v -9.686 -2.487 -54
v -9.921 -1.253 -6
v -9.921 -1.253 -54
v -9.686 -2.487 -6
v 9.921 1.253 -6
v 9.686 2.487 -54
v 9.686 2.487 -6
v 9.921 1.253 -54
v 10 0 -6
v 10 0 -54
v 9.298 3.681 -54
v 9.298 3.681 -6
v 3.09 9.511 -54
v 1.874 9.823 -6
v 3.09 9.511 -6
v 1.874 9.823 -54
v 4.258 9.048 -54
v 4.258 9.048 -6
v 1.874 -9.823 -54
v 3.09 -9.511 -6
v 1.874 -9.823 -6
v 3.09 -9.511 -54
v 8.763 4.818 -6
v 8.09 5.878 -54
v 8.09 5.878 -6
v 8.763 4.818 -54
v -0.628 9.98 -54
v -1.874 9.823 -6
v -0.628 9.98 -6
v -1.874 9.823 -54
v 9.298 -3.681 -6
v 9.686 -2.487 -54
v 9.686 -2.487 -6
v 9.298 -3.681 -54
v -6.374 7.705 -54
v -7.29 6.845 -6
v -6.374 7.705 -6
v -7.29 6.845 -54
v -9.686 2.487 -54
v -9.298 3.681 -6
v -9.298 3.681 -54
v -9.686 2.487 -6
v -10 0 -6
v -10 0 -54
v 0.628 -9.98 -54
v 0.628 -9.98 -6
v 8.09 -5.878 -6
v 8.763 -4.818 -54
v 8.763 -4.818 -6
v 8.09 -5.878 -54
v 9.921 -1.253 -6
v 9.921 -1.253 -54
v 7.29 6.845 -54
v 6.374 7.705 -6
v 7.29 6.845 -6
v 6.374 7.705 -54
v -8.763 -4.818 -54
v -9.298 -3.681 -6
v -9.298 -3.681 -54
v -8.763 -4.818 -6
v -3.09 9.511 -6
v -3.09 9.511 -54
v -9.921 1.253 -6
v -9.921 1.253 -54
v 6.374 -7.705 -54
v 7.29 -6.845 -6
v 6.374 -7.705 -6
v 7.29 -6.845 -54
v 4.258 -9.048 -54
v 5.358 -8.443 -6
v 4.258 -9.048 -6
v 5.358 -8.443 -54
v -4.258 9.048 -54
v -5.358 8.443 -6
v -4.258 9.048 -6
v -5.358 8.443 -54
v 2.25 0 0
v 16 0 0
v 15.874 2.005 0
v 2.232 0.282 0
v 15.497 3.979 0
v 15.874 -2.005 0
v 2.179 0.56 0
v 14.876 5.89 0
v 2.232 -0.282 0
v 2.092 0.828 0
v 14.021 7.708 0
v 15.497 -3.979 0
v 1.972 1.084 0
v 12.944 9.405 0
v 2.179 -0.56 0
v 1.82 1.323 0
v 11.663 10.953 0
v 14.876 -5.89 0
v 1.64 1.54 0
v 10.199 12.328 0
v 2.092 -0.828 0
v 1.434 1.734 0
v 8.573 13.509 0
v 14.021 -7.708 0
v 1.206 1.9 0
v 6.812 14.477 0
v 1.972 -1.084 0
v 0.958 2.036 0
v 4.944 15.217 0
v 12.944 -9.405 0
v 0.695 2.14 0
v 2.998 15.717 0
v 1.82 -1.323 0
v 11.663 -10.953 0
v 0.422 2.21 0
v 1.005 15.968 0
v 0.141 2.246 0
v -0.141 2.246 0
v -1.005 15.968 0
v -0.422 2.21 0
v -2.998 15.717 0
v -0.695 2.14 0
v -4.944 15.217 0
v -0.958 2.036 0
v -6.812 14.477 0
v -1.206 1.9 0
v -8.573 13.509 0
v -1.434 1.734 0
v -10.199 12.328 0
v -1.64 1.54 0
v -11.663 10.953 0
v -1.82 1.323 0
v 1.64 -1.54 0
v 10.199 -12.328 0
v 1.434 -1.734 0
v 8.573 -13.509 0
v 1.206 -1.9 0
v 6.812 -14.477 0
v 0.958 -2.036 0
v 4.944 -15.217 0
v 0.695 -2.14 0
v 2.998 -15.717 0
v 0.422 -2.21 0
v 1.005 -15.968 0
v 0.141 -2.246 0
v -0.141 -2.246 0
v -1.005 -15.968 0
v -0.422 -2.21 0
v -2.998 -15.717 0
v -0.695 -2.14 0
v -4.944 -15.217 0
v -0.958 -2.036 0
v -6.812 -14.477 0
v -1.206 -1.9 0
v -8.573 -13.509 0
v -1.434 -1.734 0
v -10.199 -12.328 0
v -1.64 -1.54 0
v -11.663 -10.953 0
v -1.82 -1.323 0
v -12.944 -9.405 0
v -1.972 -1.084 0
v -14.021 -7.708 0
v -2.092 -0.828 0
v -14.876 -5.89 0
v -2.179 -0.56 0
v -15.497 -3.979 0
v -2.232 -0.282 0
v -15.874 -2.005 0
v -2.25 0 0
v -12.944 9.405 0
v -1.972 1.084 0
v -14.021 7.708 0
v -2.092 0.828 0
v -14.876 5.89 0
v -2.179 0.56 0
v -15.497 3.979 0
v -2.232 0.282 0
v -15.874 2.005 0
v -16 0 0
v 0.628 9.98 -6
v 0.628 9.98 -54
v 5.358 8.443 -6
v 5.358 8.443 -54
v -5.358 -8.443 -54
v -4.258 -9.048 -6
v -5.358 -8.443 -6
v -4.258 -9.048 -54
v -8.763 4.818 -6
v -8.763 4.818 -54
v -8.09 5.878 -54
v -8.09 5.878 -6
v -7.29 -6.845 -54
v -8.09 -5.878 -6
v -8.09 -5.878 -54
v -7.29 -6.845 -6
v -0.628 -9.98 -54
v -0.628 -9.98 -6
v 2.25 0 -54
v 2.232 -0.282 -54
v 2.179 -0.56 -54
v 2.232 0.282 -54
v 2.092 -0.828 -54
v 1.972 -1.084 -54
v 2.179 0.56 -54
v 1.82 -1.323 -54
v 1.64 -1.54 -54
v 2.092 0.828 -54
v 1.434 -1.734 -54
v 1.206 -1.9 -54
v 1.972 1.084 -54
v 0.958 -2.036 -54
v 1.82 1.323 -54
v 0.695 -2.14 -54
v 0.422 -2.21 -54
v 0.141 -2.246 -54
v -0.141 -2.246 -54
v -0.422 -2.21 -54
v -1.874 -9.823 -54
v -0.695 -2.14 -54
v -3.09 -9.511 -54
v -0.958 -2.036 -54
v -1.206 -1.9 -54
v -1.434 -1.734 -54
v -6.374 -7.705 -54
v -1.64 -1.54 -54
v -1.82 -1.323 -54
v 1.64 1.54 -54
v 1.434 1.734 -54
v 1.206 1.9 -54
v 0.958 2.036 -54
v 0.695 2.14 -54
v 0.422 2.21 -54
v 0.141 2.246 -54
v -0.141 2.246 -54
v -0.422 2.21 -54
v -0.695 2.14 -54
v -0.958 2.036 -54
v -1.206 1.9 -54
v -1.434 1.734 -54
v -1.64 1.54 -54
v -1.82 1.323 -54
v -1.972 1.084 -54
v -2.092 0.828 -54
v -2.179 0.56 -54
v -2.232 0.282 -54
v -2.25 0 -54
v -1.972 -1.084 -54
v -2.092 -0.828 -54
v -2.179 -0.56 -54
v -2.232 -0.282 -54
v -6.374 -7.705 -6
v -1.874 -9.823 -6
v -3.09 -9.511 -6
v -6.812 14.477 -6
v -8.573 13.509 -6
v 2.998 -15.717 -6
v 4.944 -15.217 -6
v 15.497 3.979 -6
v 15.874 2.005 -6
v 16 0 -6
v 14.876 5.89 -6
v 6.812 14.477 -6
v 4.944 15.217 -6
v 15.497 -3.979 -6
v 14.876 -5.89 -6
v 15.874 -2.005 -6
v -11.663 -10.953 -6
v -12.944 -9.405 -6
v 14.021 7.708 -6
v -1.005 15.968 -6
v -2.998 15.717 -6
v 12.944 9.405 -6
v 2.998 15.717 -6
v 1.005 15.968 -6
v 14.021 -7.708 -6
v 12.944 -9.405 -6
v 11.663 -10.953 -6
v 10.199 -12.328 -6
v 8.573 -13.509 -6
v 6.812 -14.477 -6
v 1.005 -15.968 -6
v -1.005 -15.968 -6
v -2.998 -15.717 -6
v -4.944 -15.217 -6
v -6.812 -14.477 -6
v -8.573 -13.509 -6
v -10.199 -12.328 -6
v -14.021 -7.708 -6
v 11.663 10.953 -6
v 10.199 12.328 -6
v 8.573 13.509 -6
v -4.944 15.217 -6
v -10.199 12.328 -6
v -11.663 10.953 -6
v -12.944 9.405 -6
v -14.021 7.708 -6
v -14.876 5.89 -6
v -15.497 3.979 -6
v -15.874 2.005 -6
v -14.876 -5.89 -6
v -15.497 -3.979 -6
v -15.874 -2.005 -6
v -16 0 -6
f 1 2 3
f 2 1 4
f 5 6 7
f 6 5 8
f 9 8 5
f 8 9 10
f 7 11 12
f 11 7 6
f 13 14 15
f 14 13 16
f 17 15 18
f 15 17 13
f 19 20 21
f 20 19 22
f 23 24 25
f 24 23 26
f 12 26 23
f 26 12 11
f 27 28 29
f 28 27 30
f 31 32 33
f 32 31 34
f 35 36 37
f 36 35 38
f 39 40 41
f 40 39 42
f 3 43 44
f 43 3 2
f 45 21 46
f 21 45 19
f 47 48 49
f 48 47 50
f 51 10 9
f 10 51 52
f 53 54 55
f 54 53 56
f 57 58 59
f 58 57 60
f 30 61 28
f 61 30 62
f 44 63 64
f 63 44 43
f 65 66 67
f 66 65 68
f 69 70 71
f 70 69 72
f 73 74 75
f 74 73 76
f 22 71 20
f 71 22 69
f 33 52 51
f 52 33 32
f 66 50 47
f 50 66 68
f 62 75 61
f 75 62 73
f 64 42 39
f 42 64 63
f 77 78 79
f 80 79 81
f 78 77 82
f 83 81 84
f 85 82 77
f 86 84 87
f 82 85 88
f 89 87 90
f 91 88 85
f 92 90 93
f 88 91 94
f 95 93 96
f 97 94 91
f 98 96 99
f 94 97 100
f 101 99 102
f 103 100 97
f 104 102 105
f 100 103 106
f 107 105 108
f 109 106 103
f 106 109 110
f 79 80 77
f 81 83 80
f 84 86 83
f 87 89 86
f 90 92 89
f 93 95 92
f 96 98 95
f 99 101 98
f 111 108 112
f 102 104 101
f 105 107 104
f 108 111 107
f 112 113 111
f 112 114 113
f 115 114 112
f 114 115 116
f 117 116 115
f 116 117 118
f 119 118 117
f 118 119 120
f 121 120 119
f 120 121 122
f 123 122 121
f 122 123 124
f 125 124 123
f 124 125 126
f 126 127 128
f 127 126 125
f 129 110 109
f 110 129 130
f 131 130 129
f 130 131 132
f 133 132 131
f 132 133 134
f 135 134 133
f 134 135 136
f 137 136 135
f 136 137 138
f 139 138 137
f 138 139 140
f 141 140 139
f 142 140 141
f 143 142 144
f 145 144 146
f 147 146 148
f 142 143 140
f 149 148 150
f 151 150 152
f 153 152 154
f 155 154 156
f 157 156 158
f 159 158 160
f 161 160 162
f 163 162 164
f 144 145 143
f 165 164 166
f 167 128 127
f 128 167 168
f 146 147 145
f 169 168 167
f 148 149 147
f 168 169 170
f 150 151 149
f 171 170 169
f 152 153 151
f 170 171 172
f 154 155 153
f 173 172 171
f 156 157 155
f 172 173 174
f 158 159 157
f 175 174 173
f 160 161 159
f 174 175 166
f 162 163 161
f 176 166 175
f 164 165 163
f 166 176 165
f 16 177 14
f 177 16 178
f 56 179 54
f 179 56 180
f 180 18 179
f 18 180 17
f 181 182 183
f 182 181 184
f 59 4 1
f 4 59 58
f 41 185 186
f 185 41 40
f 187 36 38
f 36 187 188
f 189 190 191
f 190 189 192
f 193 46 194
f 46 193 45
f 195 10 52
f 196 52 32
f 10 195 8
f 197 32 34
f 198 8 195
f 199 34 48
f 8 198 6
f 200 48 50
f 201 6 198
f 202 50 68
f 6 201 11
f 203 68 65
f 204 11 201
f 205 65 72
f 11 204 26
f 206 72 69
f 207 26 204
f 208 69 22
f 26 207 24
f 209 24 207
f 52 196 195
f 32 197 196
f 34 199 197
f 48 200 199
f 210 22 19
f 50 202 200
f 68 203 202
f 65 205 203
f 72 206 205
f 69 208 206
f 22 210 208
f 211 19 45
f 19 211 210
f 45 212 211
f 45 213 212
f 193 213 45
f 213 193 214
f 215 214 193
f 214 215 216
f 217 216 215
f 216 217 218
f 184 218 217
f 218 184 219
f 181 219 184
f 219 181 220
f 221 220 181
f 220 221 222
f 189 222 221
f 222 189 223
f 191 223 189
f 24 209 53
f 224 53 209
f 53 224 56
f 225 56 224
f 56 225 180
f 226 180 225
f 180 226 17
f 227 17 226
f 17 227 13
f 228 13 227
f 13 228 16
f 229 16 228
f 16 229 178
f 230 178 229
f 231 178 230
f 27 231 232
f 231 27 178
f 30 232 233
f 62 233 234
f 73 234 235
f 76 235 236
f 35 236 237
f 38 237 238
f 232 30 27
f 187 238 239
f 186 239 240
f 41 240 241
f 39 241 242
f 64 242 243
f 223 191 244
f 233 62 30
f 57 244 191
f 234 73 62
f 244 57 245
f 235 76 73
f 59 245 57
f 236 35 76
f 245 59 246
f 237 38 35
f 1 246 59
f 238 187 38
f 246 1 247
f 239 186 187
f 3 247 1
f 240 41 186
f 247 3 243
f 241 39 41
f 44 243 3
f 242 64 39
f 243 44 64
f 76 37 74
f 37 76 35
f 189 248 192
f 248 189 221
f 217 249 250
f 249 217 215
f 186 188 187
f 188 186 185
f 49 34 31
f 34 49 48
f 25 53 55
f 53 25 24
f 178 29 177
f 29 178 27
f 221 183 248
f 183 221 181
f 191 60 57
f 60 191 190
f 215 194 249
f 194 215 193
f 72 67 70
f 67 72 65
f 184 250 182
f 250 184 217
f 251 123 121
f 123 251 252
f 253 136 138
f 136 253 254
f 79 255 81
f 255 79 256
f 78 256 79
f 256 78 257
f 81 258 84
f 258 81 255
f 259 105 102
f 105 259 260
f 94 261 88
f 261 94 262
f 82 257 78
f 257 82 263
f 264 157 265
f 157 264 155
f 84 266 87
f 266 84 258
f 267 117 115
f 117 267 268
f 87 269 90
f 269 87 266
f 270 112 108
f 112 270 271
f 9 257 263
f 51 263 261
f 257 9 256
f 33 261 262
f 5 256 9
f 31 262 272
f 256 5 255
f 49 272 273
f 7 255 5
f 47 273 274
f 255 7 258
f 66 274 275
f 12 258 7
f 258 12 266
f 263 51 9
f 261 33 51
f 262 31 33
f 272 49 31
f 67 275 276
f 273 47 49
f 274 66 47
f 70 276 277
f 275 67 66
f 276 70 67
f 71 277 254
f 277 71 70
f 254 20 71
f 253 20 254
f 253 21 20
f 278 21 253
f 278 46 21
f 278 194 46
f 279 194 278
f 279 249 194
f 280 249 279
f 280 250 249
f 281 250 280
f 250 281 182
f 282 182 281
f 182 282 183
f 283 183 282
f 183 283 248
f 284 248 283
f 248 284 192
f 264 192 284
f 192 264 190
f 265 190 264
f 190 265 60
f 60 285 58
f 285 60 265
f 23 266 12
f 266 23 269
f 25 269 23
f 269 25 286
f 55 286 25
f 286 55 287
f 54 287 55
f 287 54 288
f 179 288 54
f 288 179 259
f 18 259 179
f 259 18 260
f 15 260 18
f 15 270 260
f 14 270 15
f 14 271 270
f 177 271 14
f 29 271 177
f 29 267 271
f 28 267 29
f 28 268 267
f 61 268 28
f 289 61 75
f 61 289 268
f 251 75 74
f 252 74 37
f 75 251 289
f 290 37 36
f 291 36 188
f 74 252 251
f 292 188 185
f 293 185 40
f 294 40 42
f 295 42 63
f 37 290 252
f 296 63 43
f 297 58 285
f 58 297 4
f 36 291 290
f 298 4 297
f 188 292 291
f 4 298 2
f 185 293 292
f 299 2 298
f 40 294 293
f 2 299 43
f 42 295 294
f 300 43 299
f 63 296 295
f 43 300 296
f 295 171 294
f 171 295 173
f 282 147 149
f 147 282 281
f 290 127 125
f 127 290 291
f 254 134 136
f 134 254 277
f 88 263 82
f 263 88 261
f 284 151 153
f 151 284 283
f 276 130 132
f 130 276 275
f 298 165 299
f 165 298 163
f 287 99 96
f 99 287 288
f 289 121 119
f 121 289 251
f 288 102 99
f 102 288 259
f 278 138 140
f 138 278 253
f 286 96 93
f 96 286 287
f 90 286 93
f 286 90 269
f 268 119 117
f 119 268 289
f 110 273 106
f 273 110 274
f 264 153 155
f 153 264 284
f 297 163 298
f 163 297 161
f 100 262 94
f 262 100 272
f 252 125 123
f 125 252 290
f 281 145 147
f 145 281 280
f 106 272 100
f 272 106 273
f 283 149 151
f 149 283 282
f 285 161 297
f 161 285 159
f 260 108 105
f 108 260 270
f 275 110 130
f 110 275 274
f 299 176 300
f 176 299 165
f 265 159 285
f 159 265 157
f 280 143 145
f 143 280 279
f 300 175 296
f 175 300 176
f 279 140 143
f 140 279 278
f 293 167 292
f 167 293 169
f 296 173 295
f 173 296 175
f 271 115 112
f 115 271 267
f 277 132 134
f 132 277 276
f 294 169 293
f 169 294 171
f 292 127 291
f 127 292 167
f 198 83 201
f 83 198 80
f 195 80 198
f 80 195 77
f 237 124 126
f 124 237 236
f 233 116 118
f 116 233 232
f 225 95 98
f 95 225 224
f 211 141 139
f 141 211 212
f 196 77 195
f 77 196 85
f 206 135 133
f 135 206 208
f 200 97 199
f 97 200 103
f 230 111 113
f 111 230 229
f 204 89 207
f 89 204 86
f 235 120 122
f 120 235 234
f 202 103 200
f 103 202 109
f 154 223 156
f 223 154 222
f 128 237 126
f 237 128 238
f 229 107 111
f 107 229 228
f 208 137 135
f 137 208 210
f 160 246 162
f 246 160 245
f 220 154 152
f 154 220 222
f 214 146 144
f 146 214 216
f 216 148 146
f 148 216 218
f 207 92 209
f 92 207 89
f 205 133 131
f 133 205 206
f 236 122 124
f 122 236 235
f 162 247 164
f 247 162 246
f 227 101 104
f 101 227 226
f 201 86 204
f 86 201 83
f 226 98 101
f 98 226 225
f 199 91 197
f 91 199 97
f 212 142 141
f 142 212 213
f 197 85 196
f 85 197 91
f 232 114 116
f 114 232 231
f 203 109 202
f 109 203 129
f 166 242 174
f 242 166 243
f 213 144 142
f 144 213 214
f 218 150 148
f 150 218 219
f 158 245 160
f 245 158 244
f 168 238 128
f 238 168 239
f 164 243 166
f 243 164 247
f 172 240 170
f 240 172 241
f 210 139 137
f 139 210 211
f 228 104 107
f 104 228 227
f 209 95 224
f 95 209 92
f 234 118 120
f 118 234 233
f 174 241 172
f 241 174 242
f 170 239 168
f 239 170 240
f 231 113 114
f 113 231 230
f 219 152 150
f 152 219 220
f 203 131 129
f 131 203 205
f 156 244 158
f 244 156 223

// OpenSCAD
$fn = 50;


difference() {
	union() {
		translate(v = [0, 0, -54.0000000000]) {
			cylinder(h = 54, r = 10.0000000000);
		}
		translate(v = [0, 0, -6.0000000000]) {
			cylinder(h = 6, r = 16.0000000000);
		}
	}
	union() {
		#translate(v = [0, 0, -54]) {
			cylinder(h = 54, r = 2.2500000000);
		}
	}
}
